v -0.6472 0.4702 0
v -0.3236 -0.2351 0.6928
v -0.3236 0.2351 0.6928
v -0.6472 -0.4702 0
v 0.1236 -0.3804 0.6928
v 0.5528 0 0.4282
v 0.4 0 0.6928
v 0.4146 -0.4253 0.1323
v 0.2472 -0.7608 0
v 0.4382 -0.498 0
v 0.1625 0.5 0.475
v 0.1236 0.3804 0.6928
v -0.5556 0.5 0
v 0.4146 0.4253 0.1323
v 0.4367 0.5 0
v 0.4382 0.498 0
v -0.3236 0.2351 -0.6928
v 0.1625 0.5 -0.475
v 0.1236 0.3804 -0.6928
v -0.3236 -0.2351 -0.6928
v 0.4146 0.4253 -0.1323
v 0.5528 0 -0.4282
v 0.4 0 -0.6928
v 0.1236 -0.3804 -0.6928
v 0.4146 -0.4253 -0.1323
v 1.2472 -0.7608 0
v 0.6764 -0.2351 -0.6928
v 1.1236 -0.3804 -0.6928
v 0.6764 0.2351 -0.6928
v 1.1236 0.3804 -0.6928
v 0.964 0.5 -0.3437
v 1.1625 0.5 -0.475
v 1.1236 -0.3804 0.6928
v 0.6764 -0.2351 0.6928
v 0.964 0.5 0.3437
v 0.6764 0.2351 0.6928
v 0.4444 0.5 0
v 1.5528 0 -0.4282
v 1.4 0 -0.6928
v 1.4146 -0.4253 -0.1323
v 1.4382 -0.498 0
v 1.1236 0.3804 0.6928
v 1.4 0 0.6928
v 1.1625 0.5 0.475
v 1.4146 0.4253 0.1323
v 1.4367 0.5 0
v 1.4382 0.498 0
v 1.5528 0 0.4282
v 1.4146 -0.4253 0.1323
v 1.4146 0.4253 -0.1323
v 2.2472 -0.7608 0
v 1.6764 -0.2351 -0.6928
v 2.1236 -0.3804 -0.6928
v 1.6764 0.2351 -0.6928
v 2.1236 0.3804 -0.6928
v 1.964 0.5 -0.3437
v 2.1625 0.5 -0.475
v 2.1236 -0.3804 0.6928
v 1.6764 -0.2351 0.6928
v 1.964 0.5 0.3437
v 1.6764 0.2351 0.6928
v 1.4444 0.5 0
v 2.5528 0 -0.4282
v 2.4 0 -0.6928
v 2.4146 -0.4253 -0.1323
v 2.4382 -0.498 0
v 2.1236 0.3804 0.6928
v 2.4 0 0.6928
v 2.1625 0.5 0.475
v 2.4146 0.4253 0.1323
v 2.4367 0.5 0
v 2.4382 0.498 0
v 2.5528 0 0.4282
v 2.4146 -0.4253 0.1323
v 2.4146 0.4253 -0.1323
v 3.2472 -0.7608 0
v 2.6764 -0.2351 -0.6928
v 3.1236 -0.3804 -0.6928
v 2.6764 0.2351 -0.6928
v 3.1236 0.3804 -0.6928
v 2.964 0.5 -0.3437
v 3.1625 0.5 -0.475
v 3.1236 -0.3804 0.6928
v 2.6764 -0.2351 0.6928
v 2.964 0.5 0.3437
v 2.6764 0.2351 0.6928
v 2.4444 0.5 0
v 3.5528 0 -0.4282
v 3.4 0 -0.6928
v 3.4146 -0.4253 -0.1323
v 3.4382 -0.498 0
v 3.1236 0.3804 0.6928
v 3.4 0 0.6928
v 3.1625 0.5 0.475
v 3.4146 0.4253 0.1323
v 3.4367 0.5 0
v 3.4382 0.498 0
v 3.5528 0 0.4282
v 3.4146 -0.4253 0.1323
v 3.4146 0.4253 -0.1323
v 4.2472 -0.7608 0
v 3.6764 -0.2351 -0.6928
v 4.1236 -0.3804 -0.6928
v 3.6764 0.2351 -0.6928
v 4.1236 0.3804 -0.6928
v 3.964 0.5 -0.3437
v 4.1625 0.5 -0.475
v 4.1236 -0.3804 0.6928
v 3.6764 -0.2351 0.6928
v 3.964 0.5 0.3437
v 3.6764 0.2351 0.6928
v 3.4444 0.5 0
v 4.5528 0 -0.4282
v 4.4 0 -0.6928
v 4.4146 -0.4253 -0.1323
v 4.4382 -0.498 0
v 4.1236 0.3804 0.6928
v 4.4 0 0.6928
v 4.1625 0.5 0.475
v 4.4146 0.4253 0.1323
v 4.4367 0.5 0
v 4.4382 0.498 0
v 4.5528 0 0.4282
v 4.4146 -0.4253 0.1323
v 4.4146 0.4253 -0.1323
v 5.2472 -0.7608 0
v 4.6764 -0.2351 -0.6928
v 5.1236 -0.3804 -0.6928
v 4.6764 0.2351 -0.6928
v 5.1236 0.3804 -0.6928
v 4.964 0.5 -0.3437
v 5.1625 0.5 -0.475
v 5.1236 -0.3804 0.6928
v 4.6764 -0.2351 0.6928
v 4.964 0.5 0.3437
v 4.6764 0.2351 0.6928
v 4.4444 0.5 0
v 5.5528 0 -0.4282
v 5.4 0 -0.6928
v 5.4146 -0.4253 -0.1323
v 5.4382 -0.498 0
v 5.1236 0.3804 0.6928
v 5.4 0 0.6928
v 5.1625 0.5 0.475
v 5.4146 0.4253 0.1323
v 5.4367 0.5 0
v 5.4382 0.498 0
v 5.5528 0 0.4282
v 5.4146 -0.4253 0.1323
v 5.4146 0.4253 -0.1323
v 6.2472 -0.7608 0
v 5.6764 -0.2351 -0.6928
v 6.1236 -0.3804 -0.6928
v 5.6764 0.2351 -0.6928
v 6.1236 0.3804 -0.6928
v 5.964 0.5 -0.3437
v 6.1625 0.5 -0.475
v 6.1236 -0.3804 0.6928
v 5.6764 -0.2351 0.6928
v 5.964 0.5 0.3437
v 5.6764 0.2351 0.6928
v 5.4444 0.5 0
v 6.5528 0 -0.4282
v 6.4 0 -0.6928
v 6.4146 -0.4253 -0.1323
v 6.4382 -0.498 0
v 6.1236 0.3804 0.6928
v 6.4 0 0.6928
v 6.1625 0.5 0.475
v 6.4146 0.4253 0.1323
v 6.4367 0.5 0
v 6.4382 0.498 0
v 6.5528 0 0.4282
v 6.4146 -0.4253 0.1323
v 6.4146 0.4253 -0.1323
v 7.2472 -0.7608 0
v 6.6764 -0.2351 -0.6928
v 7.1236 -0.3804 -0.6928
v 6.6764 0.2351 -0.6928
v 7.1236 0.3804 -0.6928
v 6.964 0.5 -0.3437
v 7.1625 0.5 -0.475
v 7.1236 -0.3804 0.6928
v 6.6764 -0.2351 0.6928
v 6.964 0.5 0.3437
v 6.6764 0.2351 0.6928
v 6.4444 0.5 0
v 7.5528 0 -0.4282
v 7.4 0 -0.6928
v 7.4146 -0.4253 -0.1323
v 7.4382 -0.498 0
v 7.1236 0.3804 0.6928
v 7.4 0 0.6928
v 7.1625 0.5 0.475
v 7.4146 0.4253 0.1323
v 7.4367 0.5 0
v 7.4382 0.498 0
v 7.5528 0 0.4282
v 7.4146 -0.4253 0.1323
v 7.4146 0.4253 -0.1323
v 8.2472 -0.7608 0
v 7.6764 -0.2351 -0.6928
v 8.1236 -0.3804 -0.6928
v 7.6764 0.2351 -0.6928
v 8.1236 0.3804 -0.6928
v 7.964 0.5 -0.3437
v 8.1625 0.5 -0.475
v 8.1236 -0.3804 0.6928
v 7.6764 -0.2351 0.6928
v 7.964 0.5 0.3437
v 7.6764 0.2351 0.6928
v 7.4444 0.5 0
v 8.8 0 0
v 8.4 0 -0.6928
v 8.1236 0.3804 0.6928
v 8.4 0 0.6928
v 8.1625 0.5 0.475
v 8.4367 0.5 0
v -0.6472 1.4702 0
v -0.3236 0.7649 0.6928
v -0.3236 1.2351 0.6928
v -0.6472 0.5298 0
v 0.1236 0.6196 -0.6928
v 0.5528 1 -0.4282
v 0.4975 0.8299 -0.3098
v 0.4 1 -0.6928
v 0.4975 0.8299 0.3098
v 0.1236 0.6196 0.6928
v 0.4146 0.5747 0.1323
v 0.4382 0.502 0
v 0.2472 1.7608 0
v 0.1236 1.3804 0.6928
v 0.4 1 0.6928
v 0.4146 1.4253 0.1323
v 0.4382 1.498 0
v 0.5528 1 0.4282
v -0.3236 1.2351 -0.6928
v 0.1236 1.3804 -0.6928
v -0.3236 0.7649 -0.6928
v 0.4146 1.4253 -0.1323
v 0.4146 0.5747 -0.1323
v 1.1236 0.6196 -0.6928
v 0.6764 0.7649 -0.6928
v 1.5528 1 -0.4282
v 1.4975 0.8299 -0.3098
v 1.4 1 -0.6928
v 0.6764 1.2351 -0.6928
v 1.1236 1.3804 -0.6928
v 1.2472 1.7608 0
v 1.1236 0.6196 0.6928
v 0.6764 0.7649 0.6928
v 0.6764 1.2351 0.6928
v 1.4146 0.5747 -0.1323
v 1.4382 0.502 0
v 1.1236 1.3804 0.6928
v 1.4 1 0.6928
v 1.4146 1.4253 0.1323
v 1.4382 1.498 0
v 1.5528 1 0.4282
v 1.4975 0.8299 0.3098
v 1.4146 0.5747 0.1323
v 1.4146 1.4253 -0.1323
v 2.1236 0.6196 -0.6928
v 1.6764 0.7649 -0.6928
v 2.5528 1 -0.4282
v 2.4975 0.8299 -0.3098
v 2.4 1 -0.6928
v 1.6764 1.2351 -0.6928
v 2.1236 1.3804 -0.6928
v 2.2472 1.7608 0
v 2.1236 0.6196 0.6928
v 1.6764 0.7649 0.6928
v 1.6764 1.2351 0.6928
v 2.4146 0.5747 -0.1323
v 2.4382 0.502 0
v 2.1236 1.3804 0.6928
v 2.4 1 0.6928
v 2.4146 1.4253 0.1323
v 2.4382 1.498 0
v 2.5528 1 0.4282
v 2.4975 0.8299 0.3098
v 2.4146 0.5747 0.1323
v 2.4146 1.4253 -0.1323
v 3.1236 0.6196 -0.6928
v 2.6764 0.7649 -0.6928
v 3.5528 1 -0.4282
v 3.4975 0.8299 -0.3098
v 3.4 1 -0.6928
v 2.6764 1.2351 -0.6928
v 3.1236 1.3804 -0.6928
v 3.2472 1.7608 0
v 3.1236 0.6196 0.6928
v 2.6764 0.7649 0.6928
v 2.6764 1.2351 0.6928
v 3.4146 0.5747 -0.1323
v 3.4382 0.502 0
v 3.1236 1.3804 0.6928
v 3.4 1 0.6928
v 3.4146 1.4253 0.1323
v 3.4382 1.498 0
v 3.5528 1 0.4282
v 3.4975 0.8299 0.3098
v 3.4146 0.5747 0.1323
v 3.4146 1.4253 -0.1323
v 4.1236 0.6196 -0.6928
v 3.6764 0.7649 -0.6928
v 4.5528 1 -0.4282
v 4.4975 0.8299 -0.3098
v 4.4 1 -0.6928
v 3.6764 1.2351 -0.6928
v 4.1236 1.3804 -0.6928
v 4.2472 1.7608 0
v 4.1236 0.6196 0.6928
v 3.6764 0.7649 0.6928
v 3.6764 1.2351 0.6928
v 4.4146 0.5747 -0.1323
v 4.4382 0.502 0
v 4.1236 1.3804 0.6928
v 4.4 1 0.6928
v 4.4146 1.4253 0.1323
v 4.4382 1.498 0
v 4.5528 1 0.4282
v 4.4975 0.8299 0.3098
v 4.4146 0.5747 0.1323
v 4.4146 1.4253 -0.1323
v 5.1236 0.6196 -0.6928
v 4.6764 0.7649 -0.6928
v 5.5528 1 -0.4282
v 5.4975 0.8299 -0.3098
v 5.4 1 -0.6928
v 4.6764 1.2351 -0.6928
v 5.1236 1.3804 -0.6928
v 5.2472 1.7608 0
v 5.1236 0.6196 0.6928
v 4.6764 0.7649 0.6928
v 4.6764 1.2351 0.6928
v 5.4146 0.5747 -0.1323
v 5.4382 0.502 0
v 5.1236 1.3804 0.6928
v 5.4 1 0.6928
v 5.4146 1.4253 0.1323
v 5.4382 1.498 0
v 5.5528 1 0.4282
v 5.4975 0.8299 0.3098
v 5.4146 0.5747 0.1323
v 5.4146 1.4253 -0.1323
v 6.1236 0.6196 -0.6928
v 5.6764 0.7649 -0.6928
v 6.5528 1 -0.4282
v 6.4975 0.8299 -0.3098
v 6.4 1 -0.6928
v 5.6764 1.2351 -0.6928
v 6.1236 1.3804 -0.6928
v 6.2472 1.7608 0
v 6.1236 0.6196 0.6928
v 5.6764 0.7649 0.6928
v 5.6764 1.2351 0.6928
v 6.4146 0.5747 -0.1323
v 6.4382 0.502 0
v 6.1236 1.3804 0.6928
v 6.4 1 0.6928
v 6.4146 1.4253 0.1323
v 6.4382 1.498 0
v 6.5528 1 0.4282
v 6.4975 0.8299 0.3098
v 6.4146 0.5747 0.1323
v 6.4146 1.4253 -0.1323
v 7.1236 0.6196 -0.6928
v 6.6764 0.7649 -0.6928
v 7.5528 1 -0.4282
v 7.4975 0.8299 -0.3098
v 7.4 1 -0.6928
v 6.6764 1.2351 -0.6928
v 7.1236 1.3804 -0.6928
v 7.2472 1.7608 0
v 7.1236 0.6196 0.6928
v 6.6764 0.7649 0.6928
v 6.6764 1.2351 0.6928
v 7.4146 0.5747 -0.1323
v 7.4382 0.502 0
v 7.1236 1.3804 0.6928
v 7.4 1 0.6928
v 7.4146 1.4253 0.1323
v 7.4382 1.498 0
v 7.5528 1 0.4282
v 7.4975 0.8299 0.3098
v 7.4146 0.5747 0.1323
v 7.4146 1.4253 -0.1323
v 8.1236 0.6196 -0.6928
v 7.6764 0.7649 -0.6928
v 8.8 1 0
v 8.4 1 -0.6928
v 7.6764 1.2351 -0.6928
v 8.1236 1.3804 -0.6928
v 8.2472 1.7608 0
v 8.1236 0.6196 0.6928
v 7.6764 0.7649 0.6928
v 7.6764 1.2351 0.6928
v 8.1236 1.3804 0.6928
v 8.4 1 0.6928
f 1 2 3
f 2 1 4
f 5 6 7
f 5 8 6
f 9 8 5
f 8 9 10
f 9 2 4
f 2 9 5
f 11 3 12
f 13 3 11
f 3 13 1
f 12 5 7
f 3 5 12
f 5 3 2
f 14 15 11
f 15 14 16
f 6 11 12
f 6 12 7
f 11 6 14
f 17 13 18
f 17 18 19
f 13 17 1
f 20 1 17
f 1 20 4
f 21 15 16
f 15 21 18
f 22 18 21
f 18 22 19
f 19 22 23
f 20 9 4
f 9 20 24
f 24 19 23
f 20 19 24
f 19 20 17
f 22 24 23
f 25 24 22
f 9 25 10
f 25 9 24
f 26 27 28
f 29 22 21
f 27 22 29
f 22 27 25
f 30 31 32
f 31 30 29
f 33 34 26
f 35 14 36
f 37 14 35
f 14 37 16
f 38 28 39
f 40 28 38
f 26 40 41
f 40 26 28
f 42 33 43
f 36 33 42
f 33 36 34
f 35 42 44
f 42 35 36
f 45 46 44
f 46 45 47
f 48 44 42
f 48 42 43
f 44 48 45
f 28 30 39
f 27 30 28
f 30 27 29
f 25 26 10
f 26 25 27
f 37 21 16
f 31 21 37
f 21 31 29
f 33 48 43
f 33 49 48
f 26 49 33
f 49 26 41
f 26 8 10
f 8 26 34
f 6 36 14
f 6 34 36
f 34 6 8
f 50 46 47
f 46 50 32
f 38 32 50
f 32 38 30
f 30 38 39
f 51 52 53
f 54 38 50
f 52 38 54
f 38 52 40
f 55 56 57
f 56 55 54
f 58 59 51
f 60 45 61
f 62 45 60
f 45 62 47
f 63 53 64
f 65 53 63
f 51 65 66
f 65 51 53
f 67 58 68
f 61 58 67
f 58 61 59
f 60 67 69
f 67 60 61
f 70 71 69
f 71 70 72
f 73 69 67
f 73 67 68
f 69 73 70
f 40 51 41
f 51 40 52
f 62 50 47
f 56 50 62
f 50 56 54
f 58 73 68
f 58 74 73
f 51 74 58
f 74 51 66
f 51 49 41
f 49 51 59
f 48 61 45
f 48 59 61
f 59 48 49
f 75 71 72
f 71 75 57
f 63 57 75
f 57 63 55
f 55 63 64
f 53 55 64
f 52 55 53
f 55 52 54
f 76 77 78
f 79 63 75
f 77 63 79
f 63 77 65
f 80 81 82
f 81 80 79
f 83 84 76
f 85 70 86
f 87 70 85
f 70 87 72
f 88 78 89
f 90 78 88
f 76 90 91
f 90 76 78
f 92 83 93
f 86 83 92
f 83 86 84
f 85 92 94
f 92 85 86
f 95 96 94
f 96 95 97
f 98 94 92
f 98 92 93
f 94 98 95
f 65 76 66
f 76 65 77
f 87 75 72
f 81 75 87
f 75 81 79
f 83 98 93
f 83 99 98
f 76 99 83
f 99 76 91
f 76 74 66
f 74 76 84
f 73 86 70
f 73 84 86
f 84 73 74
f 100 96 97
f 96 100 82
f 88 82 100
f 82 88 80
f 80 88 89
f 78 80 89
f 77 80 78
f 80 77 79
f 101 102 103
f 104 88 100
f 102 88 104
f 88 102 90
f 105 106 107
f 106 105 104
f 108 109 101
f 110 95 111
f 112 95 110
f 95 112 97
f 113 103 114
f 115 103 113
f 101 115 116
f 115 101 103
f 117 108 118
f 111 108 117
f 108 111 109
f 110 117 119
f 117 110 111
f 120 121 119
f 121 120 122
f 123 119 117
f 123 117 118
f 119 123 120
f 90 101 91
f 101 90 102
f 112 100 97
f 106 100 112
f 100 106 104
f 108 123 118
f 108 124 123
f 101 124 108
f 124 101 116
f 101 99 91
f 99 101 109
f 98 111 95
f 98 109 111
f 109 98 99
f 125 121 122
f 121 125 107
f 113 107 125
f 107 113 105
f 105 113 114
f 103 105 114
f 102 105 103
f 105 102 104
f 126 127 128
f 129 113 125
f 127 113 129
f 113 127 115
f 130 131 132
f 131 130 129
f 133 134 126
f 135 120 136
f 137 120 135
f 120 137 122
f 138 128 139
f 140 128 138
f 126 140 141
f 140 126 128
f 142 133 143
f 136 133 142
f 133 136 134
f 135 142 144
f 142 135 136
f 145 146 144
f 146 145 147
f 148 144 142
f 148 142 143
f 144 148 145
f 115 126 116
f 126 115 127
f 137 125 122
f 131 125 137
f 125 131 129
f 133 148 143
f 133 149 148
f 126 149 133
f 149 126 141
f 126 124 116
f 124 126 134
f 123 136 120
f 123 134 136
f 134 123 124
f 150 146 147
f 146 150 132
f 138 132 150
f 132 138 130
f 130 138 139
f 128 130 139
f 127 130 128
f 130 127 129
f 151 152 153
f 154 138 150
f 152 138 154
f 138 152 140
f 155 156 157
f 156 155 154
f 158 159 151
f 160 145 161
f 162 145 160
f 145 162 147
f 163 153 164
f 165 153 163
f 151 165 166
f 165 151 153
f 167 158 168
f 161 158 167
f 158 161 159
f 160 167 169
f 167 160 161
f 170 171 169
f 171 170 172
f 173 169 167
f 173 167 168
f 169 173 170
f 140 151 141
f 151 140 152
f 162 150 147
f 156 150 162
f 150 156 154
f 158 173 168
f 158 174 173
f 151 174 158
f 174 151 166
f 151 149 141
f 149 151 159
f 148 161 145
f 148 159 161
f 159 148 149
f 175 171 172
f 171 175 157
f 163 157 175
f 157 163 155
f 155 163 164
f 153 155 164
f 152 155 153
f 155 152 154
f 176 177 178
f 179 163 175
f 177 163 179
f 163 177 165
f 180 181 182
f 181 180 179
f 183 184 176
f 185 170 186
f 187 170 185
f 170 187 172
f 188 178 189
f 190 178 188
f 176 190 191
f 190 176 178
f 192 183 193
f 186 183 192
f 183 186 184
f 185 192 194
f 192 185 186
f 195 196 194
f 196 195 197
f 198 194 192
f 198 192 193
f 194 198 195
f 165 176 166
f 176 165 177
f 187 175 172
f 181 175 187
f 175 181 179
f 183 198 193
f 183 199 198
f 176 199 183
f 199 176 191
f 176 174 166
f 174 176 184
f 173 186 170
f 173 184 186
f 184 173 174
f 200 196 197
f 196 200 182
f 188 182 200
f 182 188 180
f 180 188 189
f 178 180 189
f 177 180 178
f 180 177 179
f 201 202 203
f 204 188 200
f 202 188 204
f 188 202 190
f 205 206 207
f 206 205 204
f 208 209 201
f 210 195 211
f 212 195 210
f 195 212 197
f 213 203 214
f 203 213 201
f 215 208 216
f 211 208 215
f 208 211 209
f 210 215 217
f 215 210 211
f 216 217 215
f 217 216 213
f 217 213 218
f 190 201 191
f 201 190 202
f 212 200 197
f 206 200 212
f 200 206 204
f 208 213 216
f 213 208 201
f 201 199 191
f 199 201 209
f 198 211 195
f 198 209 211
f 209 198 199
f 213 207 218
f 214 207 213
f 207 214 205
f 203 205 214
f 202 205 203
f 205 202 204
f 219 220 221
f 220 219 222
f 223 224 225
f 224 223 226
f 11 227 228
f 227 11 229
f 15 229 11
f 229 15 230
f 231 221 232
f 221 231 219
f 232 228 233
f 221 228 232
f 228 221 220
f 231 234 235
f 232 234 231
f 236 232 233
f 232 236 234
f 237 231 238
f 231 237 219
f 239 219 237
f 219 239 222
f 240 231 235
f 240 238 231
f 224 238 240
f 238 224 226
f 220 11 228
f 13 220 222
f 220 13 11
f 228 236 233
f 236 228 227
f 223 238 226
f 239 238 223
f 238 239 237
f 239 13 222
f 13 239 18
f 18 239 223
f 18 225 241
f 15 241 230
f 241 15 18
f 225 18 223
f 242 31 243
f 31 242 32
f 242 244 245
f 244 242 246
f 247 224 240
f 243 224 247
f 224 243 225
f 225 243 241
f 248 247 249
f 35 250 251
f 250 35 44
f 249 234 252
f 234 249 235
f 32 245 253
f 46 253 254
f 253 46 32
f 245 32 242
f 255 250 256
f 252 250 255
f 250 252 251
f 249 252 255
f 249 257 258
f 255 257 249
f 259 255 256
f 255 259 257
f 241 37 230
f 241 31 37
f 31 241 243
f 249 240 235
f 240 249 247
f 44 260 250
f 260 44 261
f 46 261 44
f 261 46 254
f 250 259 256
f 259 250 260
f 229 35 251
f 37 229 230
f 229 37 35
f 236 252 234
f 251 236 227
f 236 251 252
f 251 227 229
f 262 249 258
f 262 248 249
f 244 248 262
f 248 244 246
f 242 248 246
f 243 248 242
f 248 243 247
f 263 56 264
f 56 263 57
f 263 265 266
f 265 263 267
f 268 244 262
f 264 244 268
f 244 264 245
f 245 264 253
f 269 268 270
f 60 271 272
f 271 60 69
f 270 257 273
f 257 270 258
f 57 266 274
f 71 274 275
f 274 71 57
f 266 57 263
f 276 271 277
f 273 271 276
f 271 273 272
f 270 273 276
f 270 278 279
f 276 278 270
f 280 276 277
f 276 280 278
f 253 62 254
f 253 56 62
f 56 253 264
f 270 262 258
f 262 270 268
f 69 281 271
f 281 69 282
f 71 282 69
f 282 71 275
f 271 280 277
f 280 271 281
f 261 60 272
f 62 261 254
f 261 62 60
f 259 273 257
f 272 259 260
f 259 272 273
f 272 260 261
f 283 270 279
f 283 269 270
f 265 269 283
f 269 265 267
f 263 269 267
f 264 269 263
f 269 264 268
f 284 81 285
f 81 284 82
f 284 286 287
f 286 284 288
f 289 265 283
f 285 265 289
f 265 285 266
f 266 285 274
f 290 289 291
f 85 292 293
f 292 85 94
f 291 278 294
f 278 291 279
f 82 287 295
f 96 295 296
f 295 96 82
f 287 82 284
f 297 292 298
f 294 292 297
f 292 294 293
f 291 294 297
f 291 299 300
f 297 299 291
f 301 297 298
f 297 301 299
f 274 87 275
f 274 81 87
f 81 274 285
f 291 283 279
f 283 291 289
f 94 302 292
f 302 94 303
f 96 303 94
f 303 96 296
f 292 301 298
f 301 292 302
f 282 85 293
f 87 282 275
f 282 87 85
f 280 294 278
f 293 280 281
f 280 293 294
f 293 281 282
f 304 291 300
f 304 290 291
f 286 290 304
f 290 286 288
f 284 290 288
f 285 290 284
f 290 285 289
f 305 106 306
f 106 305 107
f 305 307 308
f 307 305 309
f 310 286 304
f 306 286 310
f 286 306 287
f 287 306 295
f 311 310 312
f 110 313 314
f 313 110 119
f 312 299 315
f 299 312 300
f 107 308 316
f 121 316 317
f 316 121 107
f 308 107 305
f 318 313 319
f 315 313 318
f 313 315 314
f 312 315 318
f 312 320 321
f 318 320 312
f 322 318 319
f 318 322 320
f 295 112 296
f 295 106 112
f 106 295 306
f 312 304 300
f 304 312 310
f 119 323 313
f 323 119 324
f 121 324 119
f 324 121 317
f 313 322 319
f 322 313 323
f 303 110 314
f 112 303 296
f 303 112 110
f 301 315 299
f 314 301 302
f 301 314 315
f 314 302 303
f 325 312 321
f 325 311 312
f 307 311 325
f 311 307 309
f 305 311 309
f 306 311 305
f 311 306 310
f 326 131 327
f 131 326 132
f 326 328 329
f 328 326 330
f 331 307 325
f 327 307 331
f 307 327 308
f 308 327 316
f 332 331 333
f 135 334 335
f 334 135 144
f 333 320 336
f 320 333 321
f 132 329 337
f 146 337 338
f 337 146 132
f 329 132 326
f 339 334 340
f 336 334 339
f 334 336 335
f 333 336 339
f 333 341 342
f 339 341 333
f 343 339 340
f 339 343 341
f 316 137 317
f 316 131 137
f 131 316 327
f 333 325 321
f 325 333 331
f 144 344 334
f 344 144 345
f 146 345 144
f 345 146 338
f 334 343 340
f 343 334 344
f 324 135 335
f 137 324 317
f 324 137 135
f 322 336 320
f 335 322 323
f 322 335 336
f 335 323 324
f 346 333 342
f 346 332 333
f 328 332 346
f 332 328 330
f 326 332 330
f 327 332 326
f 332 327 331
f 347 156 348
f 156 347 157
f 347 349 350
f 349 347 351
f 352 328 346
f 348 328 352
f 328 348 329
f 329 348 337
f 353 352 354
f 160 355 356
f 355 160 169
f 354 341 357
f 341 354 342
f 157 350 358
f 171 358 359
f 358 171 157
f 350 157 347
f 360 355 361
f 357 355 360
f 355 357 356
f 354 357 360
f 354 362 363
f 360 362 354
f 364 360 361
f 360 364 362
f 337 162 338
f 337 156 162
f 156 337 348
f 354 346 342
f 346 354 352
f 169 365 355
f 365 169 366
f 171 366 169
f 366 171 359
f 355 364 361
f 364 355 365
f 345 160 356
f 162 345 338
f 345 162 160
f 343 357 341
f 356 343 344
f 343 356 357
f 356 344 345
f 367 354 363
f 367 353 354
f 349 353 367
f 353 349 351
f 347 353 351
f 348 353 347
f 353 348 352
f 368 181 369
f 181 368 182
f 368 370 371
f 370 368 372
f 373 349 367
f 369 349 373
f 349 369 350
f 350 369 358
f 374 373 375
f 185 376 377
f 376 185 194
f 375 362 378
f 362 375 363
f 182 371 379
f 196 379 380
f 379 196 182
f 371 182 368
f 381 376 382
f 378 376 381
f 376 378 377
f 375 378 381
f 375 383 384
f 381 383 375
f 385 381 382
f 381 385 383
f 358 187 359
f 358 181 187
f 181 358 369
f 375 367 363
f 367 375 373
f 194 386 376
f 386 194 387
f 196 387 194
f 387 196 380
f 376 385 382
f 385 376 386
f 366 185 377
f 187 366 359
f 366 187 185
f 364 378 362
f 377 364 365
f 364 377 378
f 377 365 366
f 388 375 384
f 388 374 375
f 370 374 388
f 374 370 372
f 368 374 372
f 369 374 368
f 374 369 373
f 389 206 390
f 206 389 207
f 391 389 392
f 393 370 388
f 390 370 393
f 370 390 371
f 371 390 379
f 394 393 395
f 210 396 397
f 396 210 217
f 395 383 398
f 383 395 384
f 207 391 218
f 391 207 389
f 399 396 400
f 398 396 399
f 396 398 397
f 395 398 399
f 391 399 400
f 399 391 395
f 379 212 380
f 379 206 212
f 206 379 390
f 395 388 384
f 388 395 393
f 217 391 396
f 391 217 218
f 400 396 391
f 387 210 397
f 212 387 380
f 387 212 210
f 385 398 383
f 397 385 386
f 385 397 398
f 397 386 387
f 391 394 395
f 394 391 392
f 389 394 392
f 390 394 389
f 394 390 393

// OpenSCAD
$fn=5;
radius=0.8;

translate([0,0]) color("#ff0000") sphere(radius);
translate([1,0]) color("#ff7f00") sphere(radius);
translate([2,0]) color("#ffff00") sphere(radius);
translate([3,0]) color("#00FF00") sphere(radius);
translate([4,0]) color("#0000ff") sphere(radius);
translate([5,0]) color("#4b00ff") sphere(radius);
translate([6,0]) color("#9400d3") sphere(radius);
translate([7,0]) color("#000000Ff") sphere(radius);
translate([8,0]) color("#00000080") sphere(radius);
translate([0,1]) color("#f00") sphere(radius);
translate([1,1]) color("#f70") sphere(radius);
translate([2,1]) color("#ff0") sphere(radius);
translate([3,1]) color("#0F0") sphere(radius);
translate([4,1]) color("#00f") sphere(radius);
translate([5,1]) color("#40f") sphere(radius);
translate([6,1]) color("#90d") sphere(radius);
translate([7,1]) color("#000F") sphere(radius);
translate([8,1]) color("#0008") sphere(radius);
